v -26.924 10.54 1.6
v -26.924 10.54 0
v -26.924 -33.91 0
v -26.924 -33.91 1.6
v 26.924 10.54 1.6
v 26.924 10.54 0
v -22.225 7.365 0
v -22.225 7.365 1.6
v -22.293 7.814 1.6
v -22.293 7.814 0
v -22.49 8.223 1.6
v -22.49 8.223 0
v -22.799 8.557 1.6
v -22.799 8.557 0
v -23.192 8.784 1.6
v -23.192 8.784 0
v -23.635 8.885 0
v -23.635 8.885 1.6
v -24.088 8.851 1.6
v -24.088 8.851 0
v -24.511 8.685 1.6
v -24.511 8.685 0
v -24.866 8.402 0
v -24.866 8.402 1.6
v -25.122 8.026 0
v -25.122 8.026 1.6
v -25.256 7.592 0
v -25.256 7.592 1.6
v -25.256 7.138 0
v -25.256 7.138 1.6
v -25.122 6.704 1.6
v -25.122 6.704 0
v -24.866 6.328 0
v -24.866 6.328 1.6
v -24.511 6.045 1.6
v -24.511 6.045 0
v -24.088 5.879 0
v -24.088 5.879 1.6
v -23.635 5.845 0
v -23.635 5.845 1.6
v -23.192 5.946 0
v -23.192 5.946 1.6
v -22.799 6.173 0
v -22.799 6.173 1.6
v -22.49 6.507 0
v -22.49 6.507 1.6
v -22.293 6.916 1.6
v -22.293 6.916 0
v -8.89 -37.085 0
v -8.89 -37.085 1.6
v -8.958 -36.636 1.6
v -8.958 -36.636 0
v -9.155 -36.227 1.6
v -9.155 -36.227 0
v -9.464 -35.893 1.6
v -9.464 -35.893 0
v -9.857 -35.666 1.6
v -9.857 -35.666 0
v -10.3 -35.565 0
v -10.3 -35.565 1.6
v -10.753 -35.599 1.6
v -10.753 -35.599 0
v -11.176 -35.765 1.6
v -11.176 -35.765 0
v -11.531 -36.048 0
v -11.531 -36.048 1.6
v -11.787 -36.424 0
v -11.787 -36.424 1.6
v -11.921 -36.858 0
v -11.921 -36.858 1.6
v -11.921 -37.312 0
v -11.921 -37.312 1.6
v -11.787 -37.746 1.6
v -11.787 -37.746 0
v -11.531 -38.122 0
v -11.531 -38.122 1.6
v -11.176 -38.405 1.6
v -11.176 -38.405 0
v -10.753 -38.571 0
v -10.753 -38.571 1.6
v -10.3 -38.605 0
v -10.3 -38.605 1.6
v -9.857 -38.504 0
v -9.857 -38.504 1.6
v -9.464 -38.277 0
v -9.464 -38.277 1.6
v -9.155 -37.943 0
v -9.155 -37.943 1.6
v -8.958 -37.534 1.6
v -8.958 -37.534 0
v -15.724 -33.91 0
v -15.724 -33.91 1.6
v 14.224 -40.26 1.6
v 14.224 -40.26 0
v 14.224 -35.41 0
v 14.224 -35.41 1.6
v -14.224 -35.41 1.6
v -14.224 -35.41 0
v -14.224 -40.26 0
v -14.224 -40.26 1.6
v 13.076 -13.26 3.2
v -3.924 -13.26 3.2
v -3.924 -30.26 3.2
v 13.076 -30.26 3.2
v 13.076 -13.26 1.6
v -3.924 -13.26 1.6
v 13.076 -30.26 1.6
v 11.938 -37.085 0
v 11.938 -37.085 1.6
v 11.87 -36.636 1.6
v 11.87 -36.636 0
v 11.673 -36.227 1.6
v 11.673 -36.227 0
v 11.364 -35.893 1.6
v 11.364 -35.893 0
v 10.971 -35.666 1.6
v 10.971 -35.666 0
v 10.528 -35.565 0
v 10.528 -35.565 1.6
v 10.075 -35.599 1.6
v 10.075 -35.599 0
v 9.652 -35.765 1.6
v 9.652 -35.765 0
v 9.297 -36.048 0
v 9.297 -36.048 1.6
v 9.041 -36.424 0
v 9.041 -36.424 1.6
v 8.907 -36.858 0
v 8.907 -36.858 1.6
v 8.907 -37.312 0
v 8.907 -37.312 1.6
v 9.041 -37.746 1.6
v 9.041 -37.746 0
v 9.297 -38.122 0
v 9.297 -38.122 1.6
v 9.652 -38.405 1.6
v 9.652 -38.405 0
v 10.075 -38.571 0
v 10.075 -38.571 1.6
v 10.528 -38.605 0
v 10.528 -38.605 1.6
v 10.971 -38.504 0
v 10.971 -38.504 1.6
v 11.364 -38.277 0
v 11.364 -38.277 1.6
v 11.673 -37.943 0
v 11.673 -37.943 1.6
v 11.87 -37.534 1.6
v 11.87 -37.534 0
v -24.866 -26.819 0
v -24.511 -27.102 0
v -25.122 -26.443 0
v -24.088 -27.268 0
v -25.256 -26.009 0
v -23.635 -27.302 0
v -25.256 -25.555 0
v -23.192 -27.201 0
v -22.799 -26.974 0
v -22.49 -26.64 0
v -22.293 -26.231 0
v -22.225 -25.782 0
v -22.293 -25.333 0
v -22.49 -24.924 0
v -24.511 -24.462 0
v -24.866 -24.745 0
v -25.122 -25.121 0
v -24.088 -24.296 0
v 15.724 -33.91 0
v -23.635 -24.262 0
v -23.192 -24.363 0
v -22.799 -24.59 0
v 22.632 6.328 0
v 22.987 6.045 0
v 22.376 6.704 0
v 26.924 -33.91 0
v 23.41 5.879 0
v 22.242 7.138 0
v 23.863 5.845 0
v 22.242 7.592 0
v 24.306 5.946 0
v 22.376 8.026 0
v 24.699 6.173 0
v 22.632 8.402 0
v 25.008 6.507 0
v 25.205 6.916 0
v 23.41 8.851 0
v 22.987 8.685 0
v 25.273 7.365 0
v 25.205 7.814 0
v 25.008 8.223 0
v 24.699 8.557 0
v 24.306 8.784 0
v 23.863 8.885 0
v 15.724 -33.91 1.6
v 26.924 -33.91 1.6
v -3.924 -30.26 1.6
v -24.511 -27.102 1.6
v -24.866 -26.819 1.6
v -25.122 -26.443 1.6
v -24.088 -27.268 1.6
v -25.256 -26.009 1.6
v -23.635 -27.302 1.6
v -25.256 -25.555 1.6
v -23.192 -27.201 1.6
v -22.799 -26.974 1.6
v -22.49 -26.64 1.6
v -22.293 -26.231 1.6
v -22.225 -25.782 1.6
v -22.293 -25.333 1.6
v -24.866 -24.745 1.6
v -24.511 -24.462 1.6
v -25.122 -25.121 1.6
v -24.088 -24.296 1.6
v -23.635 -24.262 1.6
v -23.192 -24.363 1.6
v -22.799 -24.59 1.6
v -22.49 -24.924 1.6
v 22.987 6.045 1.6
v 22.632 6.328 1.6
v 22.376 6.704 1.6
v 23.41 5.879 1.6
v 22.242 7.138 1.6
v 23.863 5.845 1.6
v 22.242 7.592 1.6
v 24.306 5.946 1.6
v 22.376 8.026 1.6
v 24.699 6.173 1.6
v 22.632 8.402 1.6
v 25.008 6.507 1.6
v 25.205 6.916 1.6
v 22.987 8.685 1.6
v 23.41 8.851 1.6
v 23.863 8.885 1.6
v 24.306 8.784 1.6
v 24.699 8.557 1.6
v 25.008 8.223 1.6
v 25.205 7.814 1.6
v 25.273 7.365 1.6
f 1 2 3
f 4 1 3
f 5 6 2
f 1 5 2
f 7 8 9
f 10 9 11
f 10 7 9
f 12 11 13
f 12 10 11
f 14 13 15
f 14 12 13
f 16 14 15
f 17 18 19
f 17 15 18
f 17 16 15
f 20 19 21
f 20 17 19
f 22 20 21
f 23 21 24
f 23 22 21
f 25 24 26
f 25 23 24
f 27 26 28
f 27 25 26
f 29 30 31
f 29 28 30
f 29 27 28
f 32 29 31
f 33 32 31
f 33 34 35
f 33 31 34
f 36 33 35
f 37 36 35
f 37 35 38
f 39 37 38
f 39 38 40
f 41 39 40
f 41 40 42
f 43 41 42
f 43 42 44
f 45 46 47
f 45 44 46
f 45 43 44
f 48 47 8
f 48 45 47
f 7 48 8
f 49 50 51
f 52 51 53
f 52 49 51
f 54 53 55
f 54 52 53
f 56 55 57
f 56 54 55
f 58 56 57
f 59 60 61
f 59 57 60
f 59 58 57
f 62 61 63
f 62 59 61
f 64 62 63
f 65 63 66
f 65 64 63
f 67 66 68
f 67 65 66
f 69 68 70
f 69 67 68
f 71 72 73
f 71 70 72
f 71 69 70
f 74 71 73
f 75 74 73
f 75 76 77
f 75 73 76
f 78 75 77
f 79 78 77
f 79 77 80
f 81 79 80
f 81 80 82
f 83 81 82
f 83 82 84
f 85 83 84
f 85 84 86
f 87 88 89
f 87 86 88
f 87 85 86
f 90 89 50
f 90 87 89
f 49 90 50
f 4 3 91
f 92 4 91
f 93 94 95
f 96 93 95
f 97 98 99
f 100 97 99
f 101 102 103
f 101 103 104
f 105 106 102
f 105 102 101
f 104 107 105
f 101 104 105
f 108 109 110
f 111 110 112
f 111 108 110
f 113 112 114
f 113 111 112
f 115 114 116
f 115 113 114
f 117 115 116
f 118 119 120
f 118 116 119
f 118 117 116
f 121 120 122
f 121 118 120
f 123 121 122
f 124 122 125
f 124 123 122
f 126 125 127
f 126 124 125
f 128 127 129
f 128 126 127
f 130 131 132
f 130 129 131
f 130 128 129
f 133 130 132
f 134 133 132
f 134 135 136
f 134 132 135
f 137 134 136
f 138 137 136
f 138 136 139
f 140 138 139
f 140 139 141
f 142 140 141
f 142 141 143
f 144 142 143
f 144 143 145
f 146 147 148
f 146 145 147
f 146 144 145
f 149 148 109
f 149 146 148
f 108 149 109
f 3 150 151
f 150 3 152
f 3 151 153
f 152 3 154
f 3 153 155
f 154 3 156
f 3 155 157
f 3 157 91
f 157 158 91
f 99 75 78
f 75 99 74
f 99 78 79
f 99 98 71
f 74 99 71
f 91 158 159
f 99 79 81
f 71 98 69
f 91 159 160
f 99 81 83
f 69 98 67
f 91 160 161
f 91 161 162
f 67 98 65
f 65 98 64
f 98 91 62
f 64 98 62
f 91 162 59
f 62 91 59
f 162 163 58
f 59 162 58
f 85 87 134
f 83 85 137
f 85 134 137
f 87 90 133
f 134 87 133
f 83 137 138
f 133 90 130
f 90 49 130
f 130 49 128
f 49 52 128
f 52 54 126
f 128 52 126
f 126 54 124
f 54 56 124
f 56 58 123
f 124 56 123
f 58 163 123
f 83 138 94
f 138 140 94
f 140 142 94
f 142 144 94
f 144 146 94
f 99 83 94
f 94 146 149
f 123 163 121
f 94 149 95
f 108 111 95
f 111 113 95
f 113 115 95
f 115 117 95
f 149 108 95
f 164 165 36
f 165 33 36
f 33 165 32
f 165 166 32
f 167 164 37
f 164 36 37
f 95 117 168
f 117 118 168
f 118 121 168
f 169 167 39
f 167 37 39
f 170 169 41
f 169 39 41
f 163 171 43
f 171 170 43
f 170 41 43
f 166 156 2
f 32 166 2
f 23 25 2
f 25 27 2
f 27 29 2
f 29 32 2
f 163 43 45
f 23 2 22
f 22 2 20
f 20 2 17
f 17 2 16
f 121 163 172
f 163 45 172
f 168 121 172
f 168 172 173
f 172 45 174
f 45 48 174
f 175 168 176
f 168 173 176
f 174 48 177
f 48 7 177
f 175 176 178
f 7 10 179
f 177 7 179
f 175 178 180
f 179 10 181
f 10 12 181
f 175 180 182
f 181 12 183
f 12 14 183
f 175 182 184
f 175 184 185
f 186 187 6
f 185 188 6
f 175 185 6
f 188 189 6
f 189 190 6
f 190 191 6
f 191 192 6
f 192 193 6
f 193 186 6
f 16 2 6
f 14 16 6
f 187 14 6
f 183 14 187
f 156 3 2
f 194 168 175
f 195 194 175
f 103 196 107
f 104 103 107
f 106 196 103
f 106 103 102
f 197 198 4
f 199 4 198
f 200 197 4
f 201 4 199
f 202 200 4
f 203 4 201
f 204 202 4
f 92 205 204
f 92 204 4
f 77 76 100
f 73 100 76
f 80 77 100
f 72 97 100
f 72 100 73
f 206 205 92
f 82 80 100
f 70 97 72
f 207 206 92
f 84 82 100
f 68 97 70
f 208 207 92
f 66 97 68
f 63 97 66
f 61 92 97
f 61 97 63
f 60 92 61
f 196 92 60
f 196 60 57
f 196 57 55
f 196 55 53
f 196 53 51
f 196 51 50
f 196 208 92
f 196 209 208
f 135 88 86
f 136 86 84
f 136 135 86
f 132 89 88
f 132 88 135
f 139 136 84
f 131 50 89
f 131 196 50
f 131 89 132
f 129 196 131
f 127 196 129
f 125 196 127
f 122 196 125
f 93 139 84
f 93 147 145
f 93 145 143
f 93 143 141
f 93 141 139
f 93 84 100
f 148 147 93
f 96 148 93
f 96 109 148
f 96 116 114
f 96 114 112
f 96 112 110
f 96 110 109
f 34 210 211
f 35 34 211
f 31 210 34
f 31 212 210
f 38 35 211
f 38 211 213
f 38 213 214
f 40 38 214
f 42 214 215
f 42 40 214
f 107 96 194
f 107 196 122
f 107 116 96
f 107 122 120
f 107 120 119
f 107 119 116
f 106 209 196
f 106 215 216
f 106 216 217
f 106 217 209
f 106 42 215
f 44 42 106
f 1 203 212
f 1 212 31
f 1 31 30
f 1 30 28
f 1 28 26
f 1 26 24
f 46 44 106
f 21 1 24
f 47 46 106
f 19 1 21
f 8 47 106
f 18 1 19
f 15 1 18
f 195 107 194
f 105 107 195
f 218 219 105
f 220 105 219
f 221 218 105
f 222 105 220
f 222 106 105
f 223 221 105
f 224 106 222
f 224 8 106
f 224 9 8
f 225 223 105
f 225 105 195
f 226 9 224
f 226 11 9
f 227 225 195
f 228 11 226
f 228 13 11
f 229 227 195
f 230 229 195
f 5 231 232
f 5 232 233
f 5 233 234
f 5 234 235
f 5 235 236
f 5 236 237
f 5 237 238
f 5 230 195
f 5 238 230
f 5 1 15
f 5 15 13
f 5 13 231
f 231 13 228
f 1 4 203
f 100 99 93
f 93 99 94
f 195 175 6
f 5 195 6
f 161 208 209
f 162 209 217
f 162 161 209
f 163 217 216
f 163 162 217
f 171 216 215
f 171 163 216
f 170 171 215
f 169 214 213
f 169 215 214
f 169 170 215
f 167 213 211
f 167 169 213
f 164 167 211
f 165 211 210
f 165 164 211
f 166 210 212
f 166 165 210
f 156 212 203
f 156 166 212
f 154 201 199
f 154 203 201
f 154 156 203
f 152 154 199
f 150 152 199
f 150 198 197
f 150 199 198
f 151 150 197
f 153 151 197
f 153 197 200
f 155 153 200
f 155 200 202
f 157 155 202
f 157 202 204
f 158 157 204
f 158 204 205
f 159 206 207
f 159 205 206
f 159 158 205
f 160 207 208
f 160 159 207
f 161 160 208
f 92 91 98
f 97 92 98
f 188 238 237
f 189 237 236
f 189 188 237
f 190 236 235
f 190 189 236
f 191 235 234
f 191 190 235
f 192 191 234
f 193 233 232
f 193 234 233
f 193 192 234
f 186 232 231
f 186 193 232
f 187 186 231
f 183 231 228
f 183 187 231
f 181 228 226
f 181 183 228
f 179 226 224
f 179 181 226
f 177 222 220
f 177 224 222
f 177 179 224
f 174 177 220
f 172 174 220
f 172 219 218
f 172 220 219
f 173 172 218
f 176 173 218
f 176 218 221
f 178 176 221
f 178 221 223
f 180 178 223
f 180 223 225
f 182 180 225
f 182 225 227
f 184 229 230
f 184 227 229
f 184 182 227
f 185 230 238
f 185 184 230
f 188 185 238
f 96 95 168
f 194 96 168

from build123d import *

# Parameters (mm, degrees)
EXTRUDE1_DEPTH = 1.6
SKETCH2_R      = 1.524
EXTRUDE2_DEPTH = 2.6
SKETCH4_W      = 17
SKETCH4_H      = 17
EXTRUDE3_DEPTH = 1.6


with BuildPart() as part:
    # Sketch1 → Extrude1 (new body)
    with BuildSketch(Plane.XY):
        Polygon((15.724, -33.91), (26.924, -33.91), (26.924, 10.54), (-26.924, 10.54), (-26.924, -33.91), (-15.724, -33.91), (-14.224, -35.41), (-14.224, -40.26), (14.224, -40.26), (14.224, -35.41), align=None)
    extrude(amount=EXTRUDE1_DEPTH)

    # Sketch2 → Extrude2 (cut, through all)
    with BuildSketch(Plane.XY):
        with Locations((23.749, 7.365)):
            Circle(SKETCH2_R)
        with Locations((10.414, -37.085)):
            Circle(SKETCH2_R)
        with Locations((-10.414, -37.085)):
            Circle(SKETCH2_R)
        with Locations((-23.749, -25.782)):
            Circle(SKETCH2_R)
        with Locations((-23.749, 7.365)):
            Circle(SKETCH2_R)
    extrude(amount=EXTRUDE2_DEPTH, mode=Mode.SUBTRACT)

    # Sketch4 → Extrude3 (add)
    with BuildSketch(Plane.XY.offset(1.6)):
        with Locations((4.576, -21.76)):
            Rectangle(SKETCH4_W, SKETCH4_H)
    extrude(amount=EXTRUDE3_DEPTH)


solid = part.part
